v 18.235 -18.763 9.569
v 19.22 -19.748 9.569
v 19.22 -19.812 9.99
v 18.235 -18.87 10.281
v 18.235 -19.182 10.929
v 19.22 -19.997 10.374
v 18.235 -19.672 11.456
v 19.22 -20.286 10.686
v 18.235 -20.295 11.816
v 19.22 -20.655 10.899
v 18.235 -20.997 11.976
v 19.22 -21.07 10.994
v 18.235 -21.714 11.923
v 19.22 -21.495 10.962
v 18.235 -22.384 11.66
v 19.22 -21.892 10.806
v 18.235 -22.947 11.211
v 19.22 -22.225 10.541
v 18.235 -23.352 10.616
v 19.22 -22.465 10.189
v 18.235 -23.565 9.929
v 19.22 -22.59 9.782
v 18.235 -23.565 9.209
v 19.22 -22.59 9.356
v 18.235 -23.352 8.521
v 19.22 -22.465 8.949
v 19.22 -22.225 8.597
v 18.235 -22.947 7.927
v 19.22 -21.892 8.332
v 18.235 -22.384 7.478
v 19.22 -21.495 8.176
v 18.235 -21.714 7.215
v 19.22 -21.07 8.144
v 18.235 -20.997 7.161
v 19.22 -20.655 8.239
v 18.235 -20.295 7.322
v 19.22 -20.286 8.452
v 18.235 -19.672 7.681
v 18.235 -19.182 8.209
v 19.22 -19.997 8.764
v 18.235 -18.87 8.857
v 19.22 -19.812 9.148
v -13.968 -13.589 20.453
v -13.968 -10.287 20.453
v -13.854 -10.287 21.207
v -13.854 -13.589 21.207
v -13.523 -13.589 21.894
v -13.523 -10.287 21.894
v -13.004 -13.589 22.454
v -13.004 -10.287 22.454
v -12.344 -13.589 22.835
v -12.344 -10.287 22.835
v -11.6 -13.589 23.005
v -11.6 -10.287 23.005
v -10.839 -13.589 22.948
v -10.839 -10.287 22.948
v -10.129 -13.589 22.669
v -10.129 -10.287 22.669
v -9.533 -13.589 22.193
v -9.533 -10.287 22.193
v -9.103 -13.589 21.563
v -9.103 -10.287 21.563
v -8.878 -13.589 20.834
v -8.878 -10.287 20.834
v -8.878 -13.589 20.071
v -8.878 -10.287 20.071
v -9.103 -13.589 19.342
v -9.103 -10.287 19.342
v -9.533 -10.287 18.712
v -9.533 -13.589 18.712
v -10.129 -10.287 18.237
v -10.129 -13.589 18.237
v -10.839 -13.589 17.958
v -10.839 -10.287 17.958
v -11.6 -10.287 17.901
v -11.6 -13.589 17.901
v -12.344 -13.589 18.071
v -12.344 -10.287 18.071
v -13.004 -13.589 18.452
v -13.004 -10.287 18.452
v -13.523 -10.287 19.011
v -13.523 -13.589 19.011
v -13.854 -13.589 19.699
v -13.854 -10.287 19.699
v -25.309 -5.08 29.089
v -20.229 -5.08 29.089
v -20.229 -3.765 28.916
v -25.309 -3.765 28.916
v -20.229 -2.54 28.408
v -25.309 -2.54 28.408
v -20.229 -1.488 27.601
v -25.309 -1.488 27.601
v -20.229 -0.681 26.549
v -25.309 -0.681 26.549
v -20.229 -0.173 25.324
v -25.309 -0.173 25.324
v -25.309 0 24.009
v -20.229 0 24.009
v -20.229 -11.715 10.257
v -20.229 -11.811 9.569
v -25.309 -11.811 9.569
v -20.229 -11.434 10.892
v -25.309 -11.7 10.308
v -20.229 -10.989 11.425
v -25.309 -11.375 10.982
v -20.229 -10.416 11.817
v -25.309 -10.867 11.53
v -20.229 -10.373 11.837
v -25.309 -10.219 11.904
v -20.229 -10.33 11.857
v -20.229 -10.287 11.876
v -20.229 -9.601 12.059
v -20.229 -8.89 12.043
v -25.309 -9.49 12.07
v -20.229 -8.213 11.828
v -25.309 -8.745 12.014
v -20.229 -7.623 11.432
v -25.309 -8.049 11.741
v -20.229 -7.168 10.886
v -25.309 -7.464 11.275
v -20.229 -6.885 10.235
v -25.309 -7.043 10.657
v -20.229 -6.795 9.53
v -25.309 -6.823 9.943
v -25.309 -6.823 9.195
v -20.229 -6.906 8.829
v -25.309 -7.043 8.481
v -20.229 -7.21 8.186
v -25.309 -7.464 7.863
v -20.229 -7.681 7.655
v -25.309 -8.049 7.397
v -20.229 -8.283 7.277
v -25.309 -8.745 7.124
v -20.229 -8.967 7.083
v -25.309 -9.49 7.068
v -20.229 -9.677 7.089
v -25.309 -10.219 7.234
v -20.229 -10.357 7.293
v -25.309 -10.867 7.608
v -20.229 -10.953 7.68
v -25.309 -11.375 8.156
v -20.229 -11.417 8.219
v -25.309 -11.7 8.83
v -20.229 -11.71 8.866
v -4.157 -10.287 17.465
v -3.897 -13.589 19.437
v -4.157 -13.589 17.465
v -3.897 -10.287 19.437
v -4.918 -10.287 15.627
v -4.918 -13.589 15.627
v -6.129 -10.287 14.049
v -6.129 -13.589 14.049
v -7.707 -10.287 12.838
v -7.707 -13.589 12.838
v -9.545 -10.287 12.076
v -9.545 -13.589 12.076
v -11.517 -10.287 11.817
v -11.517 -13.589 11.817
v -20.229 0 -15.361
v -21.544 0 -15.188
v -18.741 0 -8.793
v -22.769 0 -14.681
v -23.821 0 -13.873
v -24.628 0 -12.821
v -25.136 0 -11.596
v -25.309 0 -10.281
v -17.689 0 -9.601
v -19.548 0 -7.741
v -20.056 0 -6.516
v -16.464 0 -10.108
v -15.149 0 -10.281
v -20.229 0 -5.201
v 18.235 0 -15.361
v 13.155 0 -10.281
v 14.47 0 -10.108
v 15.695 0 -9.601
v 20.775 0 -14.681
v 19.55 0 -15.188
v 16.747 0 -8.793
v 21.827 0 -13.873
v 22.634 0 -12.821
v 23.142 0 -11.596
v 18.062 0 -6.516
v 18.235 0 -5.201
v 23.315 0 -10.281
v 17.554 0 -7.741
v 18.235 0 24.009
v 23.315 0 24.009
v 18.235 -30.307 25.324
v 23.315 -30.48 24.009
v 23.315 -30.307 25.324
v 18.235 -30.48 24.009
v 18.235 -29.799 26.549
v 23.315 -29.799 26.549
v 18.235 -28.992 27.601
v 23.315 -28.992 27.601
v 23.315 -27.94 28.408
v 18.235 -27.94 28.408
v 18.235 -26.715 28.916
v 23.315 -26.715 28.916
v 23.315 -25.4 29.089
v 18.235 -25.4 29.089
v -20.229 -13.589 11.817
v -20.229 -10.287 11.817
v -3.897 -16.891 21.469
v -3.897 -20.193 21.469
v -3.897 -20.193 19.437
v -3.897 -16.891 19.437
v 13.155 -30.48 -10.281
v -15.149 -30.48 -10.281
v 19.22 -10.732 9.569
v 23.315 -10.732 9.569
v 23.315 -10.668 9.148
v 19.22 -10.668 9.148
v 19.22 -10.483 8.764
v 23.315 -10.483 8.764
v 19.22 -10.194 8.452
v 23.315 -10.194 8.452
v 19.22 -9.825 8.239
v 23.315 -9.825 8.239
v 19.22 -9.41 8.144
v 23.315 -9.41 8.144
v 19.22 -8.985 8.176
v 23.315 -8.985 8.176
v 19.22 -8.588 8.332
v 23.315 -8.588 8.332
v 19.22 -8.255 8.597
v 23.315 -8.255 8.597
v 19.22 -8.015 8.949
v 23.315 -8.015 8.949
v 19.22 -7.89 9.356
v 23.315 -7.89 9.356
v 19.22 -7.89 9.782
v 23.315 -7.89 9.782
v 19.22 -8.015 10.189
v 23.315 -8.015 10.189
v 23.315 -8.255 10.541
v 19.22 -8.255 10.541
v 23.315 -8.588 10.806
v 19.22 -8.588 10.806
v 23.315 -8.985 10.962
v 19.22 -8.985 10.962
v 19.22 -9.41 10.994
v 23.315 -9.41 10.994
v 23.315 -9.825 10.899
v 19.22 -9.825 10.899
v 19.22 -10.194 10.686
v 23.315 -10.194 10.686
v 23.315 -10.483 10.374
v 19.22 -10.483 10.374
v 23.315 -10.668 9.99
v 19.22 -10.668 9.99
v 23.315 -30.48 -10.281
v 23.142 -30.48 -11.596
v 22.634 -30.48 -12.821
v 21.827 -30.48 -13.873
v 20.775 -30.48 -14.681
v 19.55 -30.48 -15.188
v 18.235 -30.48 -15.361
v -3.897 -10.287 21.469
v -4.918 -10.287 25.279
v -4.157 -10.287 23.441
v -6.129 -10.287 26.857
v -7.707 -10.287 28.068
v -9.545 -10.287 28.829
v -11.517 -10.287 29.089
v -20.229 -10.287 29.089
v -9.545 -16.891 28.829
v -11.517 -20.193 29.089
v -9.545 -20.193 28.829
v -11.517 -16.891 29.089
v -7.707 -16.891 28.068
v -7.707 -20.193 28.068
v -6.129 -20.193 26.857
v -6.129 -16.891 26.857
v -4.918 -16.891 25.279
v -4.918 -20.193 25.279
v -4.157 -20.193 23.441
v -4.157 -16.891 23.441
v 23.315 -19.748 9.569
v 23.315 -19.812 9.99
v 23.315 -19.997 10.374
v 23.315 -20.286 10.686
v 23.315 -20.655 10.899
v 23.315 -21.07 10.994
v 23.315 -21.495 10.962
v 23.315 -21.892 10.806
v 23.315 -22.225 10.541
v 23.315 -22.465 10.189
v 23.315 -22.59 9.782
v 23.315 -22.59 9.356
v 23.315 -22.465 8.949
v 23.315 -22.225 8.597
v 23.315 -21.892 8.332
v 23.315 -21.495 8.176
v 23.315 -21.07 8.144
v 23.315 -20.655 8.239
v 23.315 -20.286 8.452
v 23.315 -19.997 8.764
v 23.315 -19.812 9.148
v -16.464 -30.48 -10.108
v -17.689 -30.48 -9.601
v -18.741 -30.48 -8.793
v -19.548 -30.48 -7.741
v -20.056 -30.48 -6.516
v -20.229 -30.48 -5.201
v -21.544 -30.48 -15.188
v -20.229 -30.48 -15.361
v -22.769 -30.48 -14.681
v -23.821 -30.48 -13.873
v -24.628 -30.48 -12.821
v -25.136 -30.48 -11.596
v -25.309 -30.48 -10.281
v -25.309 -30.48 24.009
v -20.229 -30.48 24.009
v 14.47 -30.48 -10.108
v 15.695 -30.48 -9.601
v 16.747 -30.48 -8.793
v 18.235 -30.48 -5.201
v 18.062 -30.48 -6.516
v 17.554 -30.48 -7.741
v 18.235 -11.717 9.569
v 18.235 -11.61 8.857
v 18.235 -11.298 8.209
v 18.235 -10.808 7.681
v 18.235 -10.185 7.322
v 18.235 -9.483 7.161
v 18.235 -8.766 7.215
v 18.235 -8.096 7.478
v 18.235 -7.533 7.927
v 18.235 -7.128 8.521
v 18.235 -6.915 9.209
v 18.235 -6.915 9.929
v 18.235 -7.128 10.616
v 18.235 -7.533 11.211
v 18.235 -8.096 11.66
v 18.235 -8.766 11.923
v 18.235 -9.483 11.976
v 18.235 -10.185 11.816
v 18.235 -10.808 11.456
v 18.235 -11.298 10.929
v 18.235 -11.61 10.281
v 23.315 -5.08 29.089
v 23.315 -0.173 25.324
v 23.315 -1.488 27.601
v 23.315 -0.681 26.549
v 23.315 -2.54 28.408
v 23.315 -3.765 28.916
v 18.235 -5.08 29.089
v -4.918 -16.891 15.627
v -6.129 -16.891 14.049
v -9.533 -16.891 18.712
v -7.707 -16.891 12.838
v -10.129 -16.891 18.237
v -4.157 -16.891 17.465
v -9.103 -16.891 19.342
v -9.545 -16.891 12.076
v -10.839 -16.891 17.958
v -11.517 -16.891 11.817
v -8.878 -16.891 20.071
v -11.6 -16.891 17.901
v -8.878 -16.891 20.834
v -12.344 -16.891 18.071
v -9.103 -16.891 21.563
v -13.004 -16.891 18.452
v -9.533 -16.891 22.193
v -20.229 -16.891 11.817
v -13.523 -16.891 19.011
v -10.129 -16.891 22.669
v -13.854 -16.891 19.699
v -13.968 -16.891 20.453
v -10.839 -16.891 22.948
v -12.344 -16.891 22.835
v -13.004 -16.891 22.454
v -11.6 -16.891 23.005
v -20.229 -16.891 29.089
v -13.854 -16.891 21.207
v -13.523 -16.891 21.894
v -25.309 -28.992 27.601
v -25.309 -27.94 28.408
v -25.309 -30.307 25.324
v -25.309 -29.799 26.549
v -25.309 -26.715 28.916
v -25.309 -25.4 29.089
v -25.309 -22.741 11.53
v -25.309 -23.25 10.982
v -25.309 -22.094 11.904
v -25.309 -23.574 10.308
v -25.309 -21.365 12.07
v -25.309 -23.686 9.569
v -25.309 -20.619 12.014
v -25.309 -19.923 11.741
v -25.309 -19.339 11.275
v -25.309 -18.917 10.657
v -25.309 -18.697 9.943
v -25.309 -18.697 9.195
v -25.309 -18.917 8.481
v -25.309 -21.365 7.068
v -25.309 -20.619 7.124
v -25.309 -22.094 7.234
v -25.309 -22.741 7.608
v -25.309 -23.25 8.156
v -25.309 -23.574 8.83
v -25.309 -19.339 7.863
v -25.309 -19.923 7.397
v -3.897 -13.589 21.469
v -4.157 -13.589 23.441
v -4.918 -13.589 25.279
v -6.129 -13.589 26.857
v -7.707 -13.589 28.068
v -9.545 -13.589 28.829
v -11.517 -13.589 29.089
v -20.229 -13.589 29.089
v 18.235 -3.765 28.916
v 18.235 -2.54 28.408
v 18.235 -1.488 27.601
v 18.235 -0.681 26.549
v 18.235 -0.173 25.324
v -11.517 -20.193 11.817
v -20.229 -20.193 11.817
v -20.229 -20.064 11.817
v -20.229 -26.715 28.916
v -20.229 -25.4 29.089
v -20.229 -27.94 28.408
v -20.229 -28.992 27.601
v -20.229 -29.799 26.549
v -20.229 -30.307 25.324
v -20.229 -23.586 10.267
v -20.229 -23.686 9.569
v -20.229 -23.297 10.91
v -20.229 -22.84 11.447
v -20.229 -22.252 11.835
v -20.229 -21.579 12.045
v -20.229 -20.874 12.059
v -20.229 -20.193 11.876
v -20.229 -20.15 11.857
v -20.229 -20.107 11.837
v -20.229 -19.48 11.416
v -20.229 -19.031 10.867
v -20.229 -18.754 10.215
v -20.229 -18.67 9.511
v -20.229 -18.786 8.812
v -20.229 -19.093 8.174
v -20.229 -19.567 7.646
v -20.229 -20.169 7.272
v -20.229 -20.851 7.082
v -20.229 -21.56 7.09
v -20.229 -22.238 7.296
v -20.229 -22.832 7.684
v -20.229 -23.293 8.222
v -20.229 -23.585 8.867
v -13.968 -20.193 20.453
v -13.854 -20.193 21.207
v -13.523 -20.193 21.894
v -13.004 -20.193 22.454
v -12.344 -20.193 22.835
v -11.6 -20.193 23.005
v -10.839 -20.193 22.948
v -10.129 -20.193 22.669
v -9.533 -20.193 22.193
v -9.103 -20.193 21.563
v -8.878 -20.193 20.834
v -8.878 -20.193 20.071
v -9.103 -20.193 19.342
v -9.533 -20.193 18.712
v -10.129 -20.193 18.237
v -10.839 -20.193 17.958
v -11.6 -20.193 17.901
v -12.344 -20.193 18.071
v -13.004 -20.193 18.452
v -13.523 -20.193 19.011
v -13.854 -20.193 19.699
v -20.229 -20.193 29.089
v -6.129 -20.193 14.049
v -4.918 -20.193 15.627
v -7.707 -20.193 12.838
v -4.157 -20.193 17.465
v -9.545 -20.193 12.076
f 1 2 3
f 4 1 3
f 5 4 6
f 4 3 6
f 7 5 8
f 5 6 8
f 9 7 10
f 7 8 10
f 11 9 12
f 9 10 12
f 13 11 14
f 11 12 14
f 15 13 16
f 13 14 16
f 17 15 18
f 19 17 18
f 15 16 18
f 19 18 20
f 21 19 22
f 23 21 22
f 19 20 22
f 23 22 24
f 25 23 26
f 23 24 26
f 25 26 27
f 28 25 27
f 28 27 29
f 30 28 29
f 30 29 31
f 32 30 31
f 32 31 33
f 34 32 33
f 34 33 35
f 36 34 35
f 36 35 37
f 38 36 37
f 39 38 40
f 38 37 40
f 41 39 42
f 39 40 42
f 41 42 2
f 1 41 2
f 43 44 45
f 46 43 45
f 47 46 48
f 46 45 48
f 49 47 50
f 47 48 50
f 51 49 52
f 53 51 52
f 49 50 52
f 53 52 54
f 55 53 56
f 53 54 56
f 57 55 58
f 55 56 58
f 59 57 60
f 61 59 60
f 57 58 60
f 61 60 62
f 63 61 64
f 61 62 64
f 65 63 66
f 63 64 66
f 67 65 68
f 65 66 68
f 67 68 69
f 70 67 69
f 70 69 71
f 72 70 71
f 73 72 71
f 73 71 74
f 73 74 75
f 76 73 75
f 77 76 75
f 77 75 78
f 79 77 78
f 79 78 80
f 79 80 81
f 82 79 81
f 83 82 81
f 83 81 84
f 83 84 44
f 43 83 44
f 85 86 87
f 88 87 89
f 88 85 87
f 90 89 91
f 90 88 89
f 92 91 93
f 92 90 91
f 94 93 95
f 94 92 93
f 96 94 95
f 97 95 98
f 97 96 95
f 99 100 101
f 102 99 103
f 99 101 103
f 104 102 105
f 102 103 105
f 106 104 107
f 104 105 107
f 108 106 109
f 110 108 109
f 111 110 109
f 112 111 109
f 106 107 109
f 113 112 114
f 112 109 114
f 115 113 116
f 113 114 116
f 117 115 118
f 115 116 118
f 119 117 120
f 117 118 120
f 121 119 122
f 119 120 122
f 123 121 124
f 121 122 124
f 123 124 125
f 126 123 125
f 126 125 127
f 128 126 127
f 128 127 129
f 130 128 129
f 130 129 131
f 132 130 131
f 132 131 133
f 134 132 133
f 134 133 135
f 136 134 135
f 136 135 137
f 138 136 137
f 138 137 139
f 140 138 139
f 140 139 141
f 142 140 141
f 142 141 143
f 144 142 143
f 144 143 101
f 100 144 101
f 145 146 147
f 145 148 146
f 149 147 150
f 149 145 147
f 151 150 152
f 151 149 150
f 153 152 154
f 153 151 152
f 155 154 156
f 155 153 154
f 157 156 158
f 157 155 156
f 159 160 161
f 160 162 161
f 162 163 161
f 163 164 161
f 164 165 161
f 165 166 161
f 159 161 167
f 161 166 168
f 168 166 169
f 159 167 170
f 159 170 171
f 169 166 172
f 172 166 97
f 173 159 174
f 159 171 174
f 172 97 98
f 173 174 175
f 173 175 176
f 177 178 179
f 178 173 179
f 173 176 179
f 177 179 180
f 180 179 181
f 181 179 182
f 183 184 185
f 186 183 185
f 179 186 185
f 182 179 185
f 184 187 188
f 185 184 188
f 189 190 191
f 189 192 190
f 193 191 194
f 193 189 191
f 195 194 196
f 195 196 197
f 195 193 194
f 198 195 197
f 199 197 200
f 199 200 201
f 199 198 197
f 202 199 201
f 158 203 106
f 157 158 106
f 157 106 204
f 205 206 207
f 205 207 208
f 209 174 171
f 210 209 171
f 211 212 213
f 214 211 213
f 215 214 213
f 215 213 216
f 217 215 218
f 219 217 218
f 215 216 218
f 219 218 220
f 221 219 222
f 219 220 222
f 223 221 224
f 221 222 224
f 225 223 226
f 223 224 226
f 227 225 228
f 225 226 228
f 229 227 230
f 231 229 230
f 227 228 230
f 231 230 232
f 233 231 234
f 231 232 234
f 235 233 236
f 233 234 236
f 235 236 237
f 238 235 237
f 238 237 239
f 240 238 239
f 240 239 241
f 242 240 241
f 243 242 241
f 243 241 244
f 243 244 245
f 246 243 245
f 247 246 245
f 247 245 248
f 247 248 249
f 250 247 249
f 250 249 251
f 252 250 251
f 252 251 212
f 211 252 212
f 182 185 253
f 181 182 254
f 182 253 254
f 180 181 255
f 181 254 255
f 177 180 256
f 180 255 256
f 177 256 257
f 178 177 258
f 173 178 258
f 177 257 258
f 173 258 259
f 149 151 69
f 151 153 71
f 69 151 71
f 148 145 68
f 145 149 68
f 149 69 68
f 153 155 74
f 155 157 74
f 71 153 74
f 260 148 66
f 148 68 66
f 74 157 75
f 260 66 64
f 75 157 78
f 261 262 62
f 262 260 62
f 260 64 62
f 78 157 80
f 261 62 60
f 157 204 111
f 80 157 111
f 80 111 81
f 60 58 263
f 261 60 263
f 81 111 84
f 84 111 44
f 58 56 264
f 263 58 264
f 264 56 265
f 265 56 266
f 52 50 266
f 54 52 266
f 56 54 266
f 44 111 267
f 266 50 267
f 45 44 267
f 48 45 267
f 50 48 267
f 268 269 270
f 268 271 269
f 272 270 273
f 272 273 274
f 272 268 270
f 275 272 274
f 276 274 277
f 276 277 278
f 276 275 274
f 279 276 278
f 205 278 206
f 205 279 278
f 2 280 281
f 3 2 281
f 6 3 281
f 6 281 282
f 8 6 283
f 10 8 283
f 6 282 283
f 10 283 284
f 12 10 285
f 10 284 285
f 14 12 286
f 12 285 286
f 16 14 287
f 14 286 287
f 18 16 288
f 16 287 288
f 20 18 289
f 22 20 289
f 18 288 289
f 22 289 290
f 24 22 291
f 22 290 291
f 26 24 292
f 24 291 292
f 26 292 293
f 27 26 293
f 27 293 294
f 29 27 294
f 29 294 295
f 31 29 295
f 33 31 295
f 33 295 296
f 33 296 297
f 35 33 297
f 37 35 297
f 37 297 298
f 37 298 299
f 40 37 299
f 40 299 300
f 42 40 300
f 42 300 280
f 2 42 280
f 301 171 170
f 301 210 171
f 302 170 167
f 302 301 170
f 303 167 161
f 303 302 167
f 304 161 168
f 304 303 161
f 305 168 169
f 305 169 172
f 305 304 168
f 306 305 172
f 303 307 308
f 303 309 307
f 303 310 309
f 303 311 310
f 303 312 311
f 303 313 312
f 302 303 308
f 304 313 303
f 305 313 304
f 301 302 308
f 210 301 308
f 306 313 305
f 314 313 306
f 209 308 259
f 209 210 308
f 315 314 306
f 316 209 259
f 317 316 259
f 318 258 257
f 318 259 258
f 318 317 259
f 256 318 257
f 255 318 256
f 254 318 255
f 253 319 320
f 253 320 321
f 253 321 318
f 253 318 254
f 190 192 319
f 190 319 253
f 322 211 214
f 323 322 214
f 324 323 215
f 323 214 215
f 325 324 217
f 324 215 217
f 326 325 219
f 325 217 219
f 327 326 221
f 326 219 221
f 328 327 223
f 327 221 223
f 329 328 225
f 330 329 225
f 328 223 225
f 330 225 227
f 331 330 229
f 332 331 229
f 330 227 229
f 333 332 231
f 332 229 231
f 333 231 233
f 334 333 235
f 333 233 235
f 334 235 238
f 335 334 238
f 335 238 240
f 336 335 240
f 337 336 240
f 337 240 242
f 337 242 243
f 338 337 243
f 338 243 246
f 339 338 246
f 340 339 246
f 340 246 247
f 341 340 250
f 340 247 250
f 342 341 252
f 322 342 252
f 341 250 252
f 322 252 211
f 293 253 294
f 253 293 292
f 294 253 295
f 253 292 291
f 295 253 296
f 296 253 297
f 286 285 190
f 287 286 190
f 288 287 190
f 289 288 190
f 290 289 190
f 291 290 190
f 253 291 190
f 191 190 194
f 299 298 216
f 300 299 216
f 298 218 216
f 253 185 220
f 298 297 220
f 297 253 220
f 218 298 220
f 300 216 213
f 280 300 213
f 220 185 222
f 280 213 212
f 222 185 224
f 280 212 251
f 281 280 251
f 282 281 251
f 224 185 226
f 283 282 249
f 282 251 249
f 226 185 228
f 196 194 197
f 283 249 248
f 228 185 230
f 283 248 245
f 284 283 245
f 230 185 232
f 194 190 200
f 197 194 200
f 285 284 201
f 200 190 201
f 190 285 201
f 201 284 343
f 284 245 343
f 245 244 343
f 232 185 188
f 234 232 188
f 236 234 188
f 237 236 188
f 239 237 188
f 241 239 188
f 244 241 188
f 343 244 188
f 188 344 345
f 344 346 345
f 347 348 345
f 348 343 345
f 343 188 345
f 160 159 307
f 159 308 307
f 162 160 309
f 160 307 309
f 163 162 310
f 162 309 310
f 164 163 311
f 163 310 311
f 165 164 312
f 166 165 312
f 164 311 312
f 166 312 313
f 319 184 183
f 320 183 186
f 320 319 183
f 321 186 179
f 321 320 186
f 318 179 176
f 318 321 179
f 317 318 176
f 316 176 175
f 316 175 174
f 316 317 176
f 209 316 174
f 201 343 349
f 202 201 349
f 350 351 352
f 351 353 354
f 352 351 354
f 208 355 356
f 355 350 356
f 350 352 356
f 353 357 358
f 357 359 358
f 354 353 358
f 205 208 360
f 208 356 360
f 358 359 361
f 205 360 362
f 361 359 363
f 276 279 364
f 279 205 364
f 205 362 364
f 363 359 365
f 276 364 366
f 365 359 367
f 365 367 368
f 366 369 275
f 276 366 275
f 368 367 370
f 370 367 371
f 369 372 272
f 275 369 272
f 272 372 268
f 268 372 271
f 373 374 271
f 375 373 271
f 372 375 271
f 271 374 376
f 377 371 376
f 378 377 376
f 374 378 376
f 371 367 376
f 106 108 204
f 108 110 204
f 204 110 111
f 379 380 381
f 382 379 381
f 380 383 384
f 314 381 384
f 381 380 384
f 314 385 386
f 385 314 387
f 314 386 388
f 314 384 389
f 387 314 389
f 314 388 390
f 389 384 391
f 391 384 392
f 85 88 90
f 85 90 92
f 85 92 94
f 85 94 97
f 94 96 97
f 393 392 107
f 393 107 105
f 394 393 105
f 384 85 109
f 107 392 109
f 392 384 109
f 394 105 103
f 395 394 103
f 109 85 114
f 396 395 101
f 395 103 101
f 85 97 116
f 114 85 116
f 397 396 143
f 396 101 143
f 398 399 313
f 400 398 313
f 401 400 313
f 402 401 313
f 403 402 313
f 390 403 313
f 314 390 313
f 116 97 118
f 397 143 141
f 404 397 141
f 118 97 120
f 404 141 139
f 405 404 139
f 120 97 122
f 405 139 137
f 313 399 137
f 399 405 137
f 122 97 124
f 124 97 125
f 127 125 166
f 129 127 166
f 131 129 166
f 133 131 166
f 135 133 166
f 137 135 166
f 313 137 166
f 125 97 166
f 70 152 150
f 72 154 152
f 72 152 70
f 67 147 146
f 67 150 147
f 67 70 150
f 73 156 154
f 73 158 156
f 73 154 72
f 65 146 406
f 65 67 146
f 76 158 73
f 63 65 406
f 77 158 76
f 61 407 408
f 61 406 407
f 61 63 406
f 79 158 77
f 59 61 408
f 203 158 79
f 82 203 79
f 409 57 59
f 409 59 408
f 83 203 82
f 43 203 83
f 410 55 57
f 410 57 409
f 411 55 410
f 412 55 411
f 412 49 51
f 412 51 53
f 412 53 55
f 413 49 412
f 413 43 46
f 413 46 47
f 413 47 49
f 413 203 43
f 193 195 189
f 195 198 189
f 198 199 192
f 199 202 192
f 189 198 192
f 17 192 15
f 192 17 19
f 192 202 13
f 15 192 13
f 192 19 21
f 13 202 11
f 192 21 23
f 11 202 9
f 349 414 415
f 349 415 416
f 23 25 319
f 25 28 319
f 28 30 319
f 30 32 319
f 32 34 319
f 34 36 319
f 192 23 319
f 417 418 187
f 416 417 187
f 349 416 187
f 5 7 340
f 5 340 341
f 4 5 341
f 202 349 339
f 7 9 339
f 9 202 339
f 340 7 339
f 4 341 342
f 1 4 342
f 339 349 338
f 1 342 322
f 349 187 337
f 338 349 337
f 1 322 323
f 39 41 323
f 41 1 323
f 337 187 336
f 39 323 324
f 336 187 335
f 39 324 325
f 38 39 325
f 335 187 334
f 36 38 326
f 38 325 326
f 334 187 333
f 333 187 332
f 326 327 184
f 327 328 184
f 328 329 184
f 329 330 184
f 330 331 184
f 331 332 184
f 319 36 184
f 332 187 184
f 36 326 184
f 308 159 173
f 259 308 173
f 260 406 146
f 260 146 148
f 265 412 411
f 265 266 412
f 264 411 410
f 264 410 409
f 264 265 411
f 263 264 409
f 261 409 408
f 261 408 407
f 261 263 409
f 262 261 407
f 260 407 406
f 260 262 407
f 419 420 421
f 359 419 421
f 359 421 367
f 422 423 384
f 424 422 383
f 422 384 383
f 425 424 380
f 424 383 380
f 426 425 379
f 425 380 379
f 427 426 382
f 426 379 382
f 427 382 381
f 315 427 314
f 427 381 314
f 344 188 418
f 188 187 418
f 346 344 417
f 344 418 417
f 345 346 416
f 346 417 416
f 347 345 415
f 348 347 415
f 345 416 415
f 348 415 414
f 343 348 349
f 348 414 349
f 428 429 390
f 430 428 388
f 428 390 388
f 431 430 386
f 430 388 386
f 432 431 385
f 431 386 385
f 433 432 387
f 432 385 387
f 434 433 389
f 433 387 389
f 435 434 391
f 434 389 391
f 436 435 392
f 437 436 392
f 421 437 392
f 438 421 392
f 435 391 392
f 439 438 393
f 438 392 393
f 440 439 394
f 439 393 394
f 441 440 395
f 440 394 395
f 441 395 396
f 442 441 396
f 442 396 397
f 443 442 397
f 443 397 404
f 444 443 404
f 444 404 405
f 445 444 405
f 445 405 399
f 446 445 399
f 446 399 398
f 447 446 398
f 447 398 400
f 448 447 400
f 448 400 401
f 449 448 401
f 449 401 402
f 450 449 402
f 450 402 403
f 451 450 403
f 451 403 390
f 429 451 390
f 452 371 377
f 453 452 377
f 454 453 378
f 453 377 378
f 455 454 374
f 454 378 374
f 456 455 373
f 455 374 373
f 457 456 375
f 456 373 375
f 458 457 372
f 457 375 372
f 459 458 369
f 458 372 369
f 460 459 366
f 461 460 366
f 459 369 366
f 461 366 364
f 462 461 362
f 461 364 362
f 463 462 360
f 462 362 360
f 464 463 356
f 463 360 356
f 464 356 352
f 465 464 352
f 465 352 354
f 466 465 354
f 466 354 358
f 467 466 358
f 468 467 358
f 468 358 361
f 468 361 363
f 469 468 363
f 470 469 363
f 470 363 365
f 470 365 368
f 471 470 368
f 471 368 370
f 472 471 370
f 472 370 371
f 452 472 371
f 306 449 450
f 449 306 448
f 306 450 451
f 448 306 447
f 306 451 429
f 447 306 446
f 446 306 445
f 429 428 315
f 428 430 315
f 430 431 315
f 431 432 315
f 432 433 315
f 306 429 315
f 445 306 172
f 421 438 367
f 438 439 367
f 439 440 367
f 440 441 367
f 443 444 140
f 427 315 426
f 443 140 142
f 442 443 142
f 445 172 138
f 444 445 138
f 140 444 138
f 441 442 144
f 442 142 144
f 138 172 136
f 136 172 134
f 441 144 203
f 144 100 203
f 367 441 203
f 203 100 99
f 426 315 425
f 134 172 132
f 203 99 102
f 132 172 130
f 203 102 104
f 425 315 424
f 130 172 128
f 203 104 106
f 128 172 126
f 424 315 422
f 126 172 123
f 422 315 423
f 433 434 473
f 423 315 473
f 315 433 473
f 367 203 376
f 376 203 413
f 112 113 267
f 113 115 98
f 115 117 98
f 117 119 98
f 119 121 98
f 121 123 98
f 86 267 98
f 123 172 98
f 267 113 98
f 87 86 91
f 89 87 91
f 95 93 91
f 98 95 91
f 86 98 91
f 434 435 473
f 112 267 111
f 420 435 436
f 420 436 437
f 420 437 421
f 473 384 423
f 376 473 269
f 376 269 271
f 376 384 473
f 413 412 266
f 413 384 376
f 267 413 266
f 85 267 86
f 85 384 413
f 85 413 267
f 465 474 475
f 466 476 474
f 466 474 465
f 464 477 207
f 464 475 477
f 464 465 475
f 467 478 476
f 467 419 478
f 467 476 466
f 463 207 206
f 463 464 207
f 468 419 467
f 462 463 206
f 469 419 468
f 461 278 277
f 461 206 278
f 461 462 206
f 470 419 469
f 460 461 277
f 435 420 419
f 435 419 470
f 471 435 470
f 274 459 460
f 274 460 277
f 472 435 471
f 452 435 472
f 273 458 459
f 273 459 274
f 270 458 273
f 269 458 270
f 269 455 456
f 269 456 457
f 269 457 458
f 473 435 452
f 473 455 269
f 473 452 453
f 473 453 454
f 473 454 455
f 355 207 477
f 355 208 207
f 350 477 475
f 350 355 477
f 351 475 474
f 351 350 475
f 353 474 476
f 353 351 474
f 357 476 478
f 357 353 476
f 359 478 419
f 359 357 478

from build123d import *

# Parameters (mm, degrees)
F1_DEPTH  = 30.48
F2_R      = 1.42875
F3_DEPTH  = 67.945
F4_R      = 5.08
F5_R      = 5.08
F6_R      = 5.08
F7_SIZE   = 0.98552
F8_R      = 2.50825
F9_DEPTH  = 18.161
F10_W     = 3.302
F10_H     = 17.272
F11_DEPTH = 16.3322
F12_R     = 5.08
F13_R     = 7.62
F14_R     = 7.62
F16_DEPTH = 25.4


# Not quite as in the source:
# - a feature names something its author has since deleted; it is built from what else it names


with BuildPart() as f1:
    # F0 (on Front) → F1 (new body)
    with BuildSketch(Plane.XZ):
        Polygon((-20.2290668074, 29.0888086691), (-25.3090668074, 29.0888086691), (-25.3090668074, -15.3611913309), (23.3149106546, -15.3611913309), (23.3149106546, 29.0888086691), (18.2349106546, 29.0888086691), (18.2349106546, -10.2811913309), (-20.2290668074, -10.2811913309), align=None)
    extrude(amount=F1_DEPTH)

    # F2 (on face) → F3 (cut)
    with BuildSketch(Plane.YZ.offset(23.3149106546)):
        with Locations((-21.17725, 9.5689086691)):
            Circle(F2_R)
        with BuildLine():
            ThreePointArc((-7.874, 9.5689086691), (-9.30275, 10.9976586691), (-10.7315, 9.5689086691))
            ThreePointArc((-10.7315, 9.5689086691), (-9.30275, 8.1401586691), (-7.874, 9.5689086691))
        make_face()
    extrude(amount=-F3_DEPTH, mode=Mode.SUBTRACT)

    # F4
    f4_edges = [f1.edges().sort_by_distance(p)[0] for p in [
        (20.774911, 0, 29.088809),
        (20.774911, -30.48, 29.088809),
    ]]
    fillet(f4_edges, radius=F4_R)

    # F5
    f5_edges = [f1.edges().sort_by_distance(p)[0] for p in [
        (23.314911, -15.24, -15.361191),
        (18.234911, -15.24, -10.281191),
    ]]
    fillet(f5_edges, radius=F5_R)

    # F6
    f6_edges = [f1.edges().sort_by_distance(p)[0] for p in [
        (-20.229067, -15.24, -10.281191),
        (-25.309067, -15.24, -15.361191),
    ]]
    fillet(f6_edges, radius=F6_R)

    # F7
    f7_edges = [f1.edges().sort_by_distance(p)[0] for p in [
        (18.234911, -7.874, 9.568909),
        (18.234911, -22.606, 9.568909),
    ]]
    chamfer(f7_edges, length=F7_SIZE)

    # F8 (on face) → F9 (cut)
    with BuildSketch(Plane(origin=(-25.3090668074, 0, 0), x_dir=(0, -1, 0), z_dir=(-1, 0, 0))):
        with Locations((21.17725, 9.5689086691)):
            Circle(F8_R)
        with Locations((9.30275, 9.5689086691)):
            Circle(F8_R)
    extrude(amount=-F9_DEPTH, mode=Mode.SUBTRACT)

    # F10 (on face) → F11 (join)
    with BuildSketch(Plane.YZ.offset(-20.2290668074)):
        with Locations((-11.938, 20.4528086691)):
            Rectangle(F10_W, F10_H)
        with Locations((-18.542, 20.4528086691)):
            Rectangle(F10_W, F10_H)
    extrude(amount=F11_DEPTH)

    # F12
    f12_edges = [f1.edges().sort_by_distance(p)[0] for p in [
        (-22.769067, 0, 29.088809),
        (-22.769067, -30.48, 29.088809),
    ]]
    fillet(f12_edges, radius=F12_R)

    # F13
    f13_edges = [f1.edges().sort_by_distance(p)[0] for p in [
        (-3.896867, -11.938, 29.088809),
        (-3.896867, -11.938, 11.816809),
    ]]
    fillet(f13_edges, radius=F13_R)

    # F14
    f14_edges = [f1.edges().sort_by_distance(p)[0] for p in [
        (-3.896867, -18.542, 29.088809),
        (-3.896867, -18.542, 11.816809),
    ]]
    fillet(f14_edges, radius=F14_R)

    # F15 (on face) → F16 (cut)
    with BuildSketch(Plane(origin=(0, -10.287, 0), x_dir=(-1, 0, 0), z_dir=(0, 1, 0))):
        with BuildLine():
            ThreePointArc((8.8498668074, 20.4528086691), (11.4089168074, 17.8937586691), (13.9679668074, 20.4528086691))
            ThreePointArc((13.9679668074, 20.4528086691), (11.4089168074, 23.0118586691), (8.8498668074, 20.4528086691))
        make_face()
    extrude(amount=-F16_DEPTH, mode=Mode.SUBTRACT)


solid = f1.part
